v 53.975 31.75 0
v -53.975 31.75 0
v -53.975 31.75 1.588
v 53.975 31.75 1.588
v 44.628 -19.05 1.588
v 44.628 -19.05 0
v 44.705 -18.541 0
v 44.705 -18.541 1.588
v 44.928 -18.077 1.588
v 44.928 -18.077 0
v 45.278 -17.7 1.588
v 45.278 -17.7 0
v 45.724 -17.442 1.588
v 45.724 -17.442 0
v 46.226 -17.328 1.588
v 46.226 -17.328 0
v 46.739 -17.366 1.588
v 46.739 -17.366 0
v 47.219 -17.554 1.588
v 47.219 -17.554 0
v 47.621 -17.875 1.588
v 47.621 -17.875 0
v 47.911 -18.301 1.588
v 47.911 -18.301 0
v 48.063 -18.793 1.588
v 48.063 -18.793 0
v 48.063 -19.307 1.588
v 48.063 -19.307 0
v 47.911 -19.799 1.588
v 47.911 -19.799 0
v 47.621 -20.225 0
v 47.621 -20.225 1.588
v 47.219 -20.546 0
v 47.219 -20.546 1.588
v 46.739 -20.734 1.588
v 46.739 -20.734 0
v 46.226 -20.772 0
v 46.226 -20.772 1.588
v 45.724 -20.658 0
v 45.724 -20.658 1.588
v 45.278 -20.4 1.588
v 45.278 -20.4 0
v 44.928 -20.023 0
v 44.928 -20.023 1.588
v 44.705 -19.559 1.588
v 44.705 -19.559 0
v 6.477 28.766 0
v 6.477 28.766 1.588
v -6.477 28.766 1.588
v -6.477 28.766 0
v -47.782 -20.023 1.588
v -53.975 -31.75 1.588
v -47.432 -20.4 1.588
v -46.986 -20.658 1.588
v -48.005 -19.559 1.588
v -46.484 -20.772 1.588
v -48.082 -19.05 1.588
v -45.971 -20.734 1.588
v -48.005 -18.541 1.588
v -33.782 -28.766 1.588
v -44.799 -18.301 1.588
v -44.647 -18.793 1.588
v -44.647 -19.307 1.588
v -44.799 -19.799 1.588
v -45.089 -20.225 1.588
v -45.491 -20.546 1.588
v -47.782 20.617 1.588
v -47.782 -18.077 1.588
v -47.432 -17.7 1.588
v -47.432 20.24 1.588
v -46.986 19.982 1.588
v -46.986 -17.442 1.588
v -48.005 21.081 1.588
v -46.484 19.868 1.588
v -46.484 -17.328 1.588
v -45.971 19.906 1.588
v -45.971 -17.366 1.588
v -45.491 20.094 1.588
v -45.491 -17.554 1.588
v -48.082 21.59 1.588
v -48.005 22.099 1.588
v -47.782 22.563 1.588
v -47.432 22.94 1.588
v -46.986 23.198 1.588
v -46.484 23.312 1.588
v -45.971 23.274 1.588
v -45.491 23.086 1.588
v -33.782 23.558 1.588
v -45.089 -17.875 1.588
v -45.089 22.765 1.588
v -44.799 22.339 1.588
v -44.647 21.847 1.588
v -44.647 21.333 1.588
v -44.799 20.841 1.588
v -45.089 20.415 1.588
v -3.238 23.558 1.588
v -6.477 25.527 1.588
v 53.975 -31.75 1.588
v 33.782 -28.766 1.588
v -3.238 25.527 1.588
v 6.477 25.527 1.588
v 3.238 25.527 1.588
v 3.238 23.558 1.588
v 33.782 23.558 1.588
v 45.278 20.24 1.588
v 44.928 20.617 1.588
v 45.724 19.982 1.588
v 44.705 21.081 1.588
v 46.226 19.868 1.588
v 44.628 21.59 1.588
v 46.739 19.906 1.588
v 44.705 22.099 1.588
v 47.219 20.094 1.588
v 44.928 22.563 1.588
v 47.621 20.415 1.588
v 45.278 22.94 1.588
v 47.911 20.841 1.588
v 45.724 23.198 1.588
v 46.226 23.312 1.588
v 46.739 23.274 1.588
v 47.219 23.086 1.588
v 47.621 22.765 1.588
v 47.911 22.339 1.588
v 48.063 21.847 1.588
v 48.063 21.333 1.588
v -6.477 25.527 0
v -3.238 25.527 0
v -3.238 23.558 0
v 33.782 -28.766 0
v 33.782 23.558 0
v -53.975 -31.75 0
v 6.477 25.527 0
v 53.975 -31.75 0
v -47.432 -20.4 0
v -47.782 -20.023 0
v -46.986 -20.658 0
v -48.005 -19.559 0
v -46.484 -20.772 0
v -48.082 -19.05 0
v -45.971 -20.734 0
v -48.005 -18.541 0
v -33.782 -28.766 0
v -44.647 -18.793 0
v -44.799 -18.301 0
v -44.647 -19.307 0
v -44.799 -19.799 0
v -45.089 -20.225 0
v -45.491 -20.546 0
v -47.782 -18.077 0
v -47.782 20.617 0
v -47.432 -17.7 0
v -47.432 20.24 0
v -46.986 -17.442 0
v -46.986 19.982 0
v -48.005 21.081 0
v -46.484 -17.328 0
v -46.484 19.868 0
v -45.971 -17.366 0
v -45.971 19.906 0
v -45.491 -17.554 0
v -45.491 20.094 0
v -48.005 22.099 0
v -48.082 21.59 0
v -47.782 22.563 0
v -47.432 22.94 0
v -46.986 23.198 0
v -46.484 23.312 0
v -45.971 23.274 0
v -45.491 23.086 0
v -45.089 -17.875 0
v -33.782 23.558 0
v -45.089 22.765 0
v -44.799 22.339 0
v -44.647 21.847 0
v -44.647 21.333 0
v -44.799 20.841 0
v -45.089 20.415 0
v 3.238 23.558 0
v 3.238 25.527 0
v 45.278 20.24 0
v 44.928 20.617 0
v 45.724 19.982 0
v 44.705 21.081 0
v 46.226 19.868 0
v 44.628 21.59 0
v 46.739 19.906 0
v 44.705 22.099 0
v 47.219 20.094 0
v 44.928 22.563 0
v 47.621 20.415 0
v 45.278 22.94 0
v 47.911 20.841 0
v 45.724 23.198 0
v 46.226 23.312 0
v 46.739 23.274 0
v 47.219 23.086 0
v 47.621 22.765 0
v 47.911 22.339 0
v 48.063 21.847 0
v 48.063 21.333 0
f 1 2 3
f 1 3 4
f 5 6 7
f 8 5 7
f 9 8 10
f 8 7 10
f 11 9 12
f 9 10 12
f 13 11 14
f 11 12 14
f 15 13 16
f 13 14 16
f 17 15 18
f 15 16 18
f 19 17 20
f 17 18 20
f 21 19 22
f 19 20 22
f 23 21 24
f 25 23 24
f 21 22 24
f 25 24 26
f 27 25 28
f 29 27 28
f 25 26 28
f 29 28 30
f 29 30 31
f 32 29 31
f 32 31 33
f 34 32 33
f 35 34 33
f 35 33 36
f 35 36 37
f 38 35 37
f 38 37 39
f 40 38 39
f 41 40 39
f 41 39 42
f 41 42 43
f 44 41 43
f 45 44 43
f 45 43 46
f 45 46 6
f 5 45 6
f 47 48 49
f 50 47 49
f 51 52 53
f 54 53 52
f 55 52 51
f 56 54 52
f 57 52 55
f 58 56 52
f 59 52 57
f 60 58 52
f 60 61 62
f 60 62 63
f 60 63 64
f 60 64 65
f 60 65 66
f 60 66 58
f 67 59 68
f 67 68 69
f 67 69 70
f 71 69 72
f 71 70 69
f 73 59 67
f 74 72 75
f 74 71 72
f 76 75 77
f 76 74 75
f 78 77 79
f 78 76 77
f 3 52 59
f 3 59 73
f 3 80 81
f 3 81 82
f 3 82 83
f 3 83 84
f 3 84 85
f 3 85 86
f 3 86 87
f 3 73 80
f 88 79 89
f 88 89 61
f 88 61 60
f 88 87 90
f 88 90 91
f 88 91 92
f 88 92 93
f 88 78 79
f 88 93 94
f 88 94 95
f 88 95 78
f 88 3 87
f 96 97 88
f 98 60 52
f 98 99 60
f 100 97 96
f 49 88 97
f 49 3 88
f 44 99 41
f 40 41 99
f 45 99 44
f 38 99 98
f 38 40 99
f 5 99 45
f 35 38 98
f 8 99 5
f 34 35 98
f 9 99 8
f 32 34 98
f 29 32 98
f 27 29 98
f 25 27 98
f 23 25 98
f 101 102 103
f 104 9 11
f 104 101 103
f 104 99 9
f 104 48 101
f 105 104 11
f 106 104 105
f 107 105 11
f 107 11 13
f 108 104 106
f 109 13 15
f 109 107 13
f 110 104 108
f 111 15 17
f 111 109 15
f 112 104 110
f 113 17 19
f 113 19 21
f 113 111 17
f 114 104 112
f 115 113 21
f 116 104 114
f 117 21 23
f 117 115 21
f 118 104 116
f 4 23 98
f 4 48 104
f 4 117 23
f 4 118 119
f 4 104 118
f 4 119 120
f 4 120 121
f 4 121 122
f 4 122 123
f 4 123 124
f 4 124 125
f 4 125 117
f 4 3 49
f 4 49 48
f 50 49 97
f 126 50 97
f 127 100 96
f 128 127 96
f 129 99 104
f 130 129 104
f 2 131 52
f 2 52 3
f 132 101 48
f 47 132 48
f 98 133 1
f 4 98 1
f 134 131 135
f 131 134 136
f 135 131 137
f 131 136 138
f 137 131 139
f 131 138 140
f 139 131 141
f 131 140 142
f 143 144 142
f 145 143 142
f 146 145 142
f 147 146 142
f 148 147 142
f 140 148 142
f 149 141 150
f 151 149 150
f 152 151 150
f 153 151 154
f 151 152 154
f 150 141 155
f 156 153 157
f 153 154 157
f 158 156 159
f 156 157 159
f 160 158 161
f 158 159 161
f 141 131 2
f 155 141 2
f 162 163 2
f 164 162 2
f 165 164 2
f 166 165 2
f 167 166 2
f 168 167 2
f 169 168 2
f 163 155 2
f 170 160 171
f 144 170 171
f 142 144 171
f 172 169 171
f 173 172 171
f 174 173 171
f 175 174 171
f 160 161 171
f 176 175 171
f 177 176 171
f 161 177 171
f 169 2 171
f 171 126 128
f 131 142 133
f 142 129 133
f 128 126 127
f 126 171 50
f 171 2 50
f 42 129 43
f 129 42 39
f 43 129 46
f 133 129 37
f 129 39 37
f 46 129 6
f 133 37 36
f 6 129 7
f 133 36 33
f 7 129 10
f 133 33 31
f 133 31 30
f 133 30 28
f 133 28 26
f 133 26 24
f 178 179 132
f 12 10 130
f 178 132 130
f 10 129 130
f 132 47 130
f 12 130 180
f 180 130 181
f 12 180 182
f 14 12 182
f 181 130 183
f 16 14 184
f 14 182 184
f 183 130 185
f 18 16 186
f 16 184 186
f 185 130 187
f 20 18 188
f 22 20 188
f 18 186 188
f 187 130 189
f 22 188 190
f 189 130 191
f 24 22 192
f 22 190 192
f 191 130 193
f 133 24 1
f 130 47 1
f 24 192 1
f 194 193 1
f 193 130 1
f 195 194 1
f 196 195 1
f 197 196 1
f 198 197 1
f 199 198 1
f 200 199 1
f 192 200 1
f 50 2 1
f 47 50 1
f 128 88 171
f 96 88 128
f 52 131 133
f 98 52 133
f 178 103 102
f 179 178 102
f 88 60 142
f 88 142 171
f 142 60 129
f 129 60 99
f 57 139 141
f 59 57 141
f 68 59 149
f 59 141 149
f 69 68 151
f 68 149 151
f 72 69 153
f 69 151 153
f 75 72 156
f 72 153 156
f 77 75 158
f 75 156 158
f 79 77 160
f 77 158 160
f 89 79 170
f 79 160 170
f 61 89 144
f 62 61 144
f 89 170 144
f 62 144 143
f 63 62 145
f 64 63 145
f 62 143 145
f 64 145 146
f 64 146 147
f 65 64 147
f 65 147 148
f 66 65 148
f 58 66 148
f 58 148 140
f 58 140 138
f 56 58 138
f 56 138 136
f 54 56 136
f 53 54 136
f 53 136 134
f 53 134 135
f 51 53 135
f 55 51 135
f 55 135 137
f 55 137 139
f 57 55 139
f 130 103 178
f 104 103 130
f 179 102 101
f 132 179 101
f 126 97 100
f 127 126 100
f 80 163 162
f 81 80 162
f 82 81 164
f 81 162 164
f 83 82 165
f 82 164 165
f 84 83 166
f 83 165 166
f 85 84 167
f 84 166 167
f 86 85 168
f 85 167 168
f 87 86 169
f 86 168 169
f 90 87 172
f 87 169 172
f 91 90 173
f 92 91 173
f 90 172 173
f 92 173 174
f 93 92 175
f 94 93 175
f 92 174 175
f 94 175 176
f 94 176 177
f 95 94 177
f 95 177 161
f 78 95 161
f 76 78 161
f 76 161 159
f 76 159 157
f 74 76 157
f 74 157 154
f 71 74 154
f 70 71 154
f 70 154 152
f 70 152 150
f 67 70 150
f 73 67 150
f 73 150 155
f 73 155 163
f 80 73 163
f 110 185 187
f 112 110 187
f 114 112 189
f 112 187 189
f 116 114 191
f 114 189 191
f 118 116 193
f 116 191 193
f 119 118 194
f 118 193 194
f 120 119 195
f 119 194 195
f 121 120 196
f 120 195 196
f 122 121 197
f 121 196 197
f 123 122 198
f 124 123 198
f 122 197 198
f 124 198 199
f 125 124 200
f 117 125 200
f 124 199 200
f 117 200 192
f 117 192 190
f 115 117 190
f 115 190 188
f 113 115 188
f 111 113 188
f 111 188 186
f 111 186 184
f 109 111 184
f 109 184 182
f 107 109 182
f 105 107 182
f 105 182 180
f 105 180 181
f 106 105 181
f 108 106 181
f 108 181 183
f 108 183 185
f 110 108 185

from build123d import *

# Parameters (mm, degrees)
SKETCH1_W             = 107.95
SKETCH1_H             = 63.5
BOSS_EXTRUDE1_DEPTH   = 1.5875
CUT_EXTRUDE1_DEPTH    = 63.640907411
F_4_CLEARANCE_HOLE1_D = 3.4544


with BuildPart() as part:
    # Sketch1 → Boss-Extrude1 (new body)
    with BuildSketch(Plane.XY):
        Rectangle(SKETCH1_W, SKETCH1_H)
    extrude(amount=BOSS_EXTRUDE1_DEPTH)

    # Sketch2 → Cut-Extrude1 (cut, through all)
    with BuildSketch(Plane.XY.offset(1.5875)):
        Polygon((-3.2385, 25.527), (-3.2385, 23.5585), (-33.782, 23.5585), (-33.782, -28.7655), (33.782, -28.7655), (33.782, 23.5585), (3.2385, 23.5585), (3.2385, 25.527), (6.477, 25.527), (6.477, 28.7655), (-6.477, 28.7655), (-6.477, 25.527), align=None)
    extrude(amount=-CUT_EXTRUDE1_DEPTH, mode=Mode.SUBTRACT)

    # #4 Clearance Hole1 (through all)
    with Locations(Plane.XY.offset(1.5875)):
        with Locations((-46.355, 21.59), (-46.355, -19.05), (46.355, 21.59), (46.355, -19.05)):
            Hole(F_4_CLEARANCE_HOLE1_D / 2)


solid = part.part
